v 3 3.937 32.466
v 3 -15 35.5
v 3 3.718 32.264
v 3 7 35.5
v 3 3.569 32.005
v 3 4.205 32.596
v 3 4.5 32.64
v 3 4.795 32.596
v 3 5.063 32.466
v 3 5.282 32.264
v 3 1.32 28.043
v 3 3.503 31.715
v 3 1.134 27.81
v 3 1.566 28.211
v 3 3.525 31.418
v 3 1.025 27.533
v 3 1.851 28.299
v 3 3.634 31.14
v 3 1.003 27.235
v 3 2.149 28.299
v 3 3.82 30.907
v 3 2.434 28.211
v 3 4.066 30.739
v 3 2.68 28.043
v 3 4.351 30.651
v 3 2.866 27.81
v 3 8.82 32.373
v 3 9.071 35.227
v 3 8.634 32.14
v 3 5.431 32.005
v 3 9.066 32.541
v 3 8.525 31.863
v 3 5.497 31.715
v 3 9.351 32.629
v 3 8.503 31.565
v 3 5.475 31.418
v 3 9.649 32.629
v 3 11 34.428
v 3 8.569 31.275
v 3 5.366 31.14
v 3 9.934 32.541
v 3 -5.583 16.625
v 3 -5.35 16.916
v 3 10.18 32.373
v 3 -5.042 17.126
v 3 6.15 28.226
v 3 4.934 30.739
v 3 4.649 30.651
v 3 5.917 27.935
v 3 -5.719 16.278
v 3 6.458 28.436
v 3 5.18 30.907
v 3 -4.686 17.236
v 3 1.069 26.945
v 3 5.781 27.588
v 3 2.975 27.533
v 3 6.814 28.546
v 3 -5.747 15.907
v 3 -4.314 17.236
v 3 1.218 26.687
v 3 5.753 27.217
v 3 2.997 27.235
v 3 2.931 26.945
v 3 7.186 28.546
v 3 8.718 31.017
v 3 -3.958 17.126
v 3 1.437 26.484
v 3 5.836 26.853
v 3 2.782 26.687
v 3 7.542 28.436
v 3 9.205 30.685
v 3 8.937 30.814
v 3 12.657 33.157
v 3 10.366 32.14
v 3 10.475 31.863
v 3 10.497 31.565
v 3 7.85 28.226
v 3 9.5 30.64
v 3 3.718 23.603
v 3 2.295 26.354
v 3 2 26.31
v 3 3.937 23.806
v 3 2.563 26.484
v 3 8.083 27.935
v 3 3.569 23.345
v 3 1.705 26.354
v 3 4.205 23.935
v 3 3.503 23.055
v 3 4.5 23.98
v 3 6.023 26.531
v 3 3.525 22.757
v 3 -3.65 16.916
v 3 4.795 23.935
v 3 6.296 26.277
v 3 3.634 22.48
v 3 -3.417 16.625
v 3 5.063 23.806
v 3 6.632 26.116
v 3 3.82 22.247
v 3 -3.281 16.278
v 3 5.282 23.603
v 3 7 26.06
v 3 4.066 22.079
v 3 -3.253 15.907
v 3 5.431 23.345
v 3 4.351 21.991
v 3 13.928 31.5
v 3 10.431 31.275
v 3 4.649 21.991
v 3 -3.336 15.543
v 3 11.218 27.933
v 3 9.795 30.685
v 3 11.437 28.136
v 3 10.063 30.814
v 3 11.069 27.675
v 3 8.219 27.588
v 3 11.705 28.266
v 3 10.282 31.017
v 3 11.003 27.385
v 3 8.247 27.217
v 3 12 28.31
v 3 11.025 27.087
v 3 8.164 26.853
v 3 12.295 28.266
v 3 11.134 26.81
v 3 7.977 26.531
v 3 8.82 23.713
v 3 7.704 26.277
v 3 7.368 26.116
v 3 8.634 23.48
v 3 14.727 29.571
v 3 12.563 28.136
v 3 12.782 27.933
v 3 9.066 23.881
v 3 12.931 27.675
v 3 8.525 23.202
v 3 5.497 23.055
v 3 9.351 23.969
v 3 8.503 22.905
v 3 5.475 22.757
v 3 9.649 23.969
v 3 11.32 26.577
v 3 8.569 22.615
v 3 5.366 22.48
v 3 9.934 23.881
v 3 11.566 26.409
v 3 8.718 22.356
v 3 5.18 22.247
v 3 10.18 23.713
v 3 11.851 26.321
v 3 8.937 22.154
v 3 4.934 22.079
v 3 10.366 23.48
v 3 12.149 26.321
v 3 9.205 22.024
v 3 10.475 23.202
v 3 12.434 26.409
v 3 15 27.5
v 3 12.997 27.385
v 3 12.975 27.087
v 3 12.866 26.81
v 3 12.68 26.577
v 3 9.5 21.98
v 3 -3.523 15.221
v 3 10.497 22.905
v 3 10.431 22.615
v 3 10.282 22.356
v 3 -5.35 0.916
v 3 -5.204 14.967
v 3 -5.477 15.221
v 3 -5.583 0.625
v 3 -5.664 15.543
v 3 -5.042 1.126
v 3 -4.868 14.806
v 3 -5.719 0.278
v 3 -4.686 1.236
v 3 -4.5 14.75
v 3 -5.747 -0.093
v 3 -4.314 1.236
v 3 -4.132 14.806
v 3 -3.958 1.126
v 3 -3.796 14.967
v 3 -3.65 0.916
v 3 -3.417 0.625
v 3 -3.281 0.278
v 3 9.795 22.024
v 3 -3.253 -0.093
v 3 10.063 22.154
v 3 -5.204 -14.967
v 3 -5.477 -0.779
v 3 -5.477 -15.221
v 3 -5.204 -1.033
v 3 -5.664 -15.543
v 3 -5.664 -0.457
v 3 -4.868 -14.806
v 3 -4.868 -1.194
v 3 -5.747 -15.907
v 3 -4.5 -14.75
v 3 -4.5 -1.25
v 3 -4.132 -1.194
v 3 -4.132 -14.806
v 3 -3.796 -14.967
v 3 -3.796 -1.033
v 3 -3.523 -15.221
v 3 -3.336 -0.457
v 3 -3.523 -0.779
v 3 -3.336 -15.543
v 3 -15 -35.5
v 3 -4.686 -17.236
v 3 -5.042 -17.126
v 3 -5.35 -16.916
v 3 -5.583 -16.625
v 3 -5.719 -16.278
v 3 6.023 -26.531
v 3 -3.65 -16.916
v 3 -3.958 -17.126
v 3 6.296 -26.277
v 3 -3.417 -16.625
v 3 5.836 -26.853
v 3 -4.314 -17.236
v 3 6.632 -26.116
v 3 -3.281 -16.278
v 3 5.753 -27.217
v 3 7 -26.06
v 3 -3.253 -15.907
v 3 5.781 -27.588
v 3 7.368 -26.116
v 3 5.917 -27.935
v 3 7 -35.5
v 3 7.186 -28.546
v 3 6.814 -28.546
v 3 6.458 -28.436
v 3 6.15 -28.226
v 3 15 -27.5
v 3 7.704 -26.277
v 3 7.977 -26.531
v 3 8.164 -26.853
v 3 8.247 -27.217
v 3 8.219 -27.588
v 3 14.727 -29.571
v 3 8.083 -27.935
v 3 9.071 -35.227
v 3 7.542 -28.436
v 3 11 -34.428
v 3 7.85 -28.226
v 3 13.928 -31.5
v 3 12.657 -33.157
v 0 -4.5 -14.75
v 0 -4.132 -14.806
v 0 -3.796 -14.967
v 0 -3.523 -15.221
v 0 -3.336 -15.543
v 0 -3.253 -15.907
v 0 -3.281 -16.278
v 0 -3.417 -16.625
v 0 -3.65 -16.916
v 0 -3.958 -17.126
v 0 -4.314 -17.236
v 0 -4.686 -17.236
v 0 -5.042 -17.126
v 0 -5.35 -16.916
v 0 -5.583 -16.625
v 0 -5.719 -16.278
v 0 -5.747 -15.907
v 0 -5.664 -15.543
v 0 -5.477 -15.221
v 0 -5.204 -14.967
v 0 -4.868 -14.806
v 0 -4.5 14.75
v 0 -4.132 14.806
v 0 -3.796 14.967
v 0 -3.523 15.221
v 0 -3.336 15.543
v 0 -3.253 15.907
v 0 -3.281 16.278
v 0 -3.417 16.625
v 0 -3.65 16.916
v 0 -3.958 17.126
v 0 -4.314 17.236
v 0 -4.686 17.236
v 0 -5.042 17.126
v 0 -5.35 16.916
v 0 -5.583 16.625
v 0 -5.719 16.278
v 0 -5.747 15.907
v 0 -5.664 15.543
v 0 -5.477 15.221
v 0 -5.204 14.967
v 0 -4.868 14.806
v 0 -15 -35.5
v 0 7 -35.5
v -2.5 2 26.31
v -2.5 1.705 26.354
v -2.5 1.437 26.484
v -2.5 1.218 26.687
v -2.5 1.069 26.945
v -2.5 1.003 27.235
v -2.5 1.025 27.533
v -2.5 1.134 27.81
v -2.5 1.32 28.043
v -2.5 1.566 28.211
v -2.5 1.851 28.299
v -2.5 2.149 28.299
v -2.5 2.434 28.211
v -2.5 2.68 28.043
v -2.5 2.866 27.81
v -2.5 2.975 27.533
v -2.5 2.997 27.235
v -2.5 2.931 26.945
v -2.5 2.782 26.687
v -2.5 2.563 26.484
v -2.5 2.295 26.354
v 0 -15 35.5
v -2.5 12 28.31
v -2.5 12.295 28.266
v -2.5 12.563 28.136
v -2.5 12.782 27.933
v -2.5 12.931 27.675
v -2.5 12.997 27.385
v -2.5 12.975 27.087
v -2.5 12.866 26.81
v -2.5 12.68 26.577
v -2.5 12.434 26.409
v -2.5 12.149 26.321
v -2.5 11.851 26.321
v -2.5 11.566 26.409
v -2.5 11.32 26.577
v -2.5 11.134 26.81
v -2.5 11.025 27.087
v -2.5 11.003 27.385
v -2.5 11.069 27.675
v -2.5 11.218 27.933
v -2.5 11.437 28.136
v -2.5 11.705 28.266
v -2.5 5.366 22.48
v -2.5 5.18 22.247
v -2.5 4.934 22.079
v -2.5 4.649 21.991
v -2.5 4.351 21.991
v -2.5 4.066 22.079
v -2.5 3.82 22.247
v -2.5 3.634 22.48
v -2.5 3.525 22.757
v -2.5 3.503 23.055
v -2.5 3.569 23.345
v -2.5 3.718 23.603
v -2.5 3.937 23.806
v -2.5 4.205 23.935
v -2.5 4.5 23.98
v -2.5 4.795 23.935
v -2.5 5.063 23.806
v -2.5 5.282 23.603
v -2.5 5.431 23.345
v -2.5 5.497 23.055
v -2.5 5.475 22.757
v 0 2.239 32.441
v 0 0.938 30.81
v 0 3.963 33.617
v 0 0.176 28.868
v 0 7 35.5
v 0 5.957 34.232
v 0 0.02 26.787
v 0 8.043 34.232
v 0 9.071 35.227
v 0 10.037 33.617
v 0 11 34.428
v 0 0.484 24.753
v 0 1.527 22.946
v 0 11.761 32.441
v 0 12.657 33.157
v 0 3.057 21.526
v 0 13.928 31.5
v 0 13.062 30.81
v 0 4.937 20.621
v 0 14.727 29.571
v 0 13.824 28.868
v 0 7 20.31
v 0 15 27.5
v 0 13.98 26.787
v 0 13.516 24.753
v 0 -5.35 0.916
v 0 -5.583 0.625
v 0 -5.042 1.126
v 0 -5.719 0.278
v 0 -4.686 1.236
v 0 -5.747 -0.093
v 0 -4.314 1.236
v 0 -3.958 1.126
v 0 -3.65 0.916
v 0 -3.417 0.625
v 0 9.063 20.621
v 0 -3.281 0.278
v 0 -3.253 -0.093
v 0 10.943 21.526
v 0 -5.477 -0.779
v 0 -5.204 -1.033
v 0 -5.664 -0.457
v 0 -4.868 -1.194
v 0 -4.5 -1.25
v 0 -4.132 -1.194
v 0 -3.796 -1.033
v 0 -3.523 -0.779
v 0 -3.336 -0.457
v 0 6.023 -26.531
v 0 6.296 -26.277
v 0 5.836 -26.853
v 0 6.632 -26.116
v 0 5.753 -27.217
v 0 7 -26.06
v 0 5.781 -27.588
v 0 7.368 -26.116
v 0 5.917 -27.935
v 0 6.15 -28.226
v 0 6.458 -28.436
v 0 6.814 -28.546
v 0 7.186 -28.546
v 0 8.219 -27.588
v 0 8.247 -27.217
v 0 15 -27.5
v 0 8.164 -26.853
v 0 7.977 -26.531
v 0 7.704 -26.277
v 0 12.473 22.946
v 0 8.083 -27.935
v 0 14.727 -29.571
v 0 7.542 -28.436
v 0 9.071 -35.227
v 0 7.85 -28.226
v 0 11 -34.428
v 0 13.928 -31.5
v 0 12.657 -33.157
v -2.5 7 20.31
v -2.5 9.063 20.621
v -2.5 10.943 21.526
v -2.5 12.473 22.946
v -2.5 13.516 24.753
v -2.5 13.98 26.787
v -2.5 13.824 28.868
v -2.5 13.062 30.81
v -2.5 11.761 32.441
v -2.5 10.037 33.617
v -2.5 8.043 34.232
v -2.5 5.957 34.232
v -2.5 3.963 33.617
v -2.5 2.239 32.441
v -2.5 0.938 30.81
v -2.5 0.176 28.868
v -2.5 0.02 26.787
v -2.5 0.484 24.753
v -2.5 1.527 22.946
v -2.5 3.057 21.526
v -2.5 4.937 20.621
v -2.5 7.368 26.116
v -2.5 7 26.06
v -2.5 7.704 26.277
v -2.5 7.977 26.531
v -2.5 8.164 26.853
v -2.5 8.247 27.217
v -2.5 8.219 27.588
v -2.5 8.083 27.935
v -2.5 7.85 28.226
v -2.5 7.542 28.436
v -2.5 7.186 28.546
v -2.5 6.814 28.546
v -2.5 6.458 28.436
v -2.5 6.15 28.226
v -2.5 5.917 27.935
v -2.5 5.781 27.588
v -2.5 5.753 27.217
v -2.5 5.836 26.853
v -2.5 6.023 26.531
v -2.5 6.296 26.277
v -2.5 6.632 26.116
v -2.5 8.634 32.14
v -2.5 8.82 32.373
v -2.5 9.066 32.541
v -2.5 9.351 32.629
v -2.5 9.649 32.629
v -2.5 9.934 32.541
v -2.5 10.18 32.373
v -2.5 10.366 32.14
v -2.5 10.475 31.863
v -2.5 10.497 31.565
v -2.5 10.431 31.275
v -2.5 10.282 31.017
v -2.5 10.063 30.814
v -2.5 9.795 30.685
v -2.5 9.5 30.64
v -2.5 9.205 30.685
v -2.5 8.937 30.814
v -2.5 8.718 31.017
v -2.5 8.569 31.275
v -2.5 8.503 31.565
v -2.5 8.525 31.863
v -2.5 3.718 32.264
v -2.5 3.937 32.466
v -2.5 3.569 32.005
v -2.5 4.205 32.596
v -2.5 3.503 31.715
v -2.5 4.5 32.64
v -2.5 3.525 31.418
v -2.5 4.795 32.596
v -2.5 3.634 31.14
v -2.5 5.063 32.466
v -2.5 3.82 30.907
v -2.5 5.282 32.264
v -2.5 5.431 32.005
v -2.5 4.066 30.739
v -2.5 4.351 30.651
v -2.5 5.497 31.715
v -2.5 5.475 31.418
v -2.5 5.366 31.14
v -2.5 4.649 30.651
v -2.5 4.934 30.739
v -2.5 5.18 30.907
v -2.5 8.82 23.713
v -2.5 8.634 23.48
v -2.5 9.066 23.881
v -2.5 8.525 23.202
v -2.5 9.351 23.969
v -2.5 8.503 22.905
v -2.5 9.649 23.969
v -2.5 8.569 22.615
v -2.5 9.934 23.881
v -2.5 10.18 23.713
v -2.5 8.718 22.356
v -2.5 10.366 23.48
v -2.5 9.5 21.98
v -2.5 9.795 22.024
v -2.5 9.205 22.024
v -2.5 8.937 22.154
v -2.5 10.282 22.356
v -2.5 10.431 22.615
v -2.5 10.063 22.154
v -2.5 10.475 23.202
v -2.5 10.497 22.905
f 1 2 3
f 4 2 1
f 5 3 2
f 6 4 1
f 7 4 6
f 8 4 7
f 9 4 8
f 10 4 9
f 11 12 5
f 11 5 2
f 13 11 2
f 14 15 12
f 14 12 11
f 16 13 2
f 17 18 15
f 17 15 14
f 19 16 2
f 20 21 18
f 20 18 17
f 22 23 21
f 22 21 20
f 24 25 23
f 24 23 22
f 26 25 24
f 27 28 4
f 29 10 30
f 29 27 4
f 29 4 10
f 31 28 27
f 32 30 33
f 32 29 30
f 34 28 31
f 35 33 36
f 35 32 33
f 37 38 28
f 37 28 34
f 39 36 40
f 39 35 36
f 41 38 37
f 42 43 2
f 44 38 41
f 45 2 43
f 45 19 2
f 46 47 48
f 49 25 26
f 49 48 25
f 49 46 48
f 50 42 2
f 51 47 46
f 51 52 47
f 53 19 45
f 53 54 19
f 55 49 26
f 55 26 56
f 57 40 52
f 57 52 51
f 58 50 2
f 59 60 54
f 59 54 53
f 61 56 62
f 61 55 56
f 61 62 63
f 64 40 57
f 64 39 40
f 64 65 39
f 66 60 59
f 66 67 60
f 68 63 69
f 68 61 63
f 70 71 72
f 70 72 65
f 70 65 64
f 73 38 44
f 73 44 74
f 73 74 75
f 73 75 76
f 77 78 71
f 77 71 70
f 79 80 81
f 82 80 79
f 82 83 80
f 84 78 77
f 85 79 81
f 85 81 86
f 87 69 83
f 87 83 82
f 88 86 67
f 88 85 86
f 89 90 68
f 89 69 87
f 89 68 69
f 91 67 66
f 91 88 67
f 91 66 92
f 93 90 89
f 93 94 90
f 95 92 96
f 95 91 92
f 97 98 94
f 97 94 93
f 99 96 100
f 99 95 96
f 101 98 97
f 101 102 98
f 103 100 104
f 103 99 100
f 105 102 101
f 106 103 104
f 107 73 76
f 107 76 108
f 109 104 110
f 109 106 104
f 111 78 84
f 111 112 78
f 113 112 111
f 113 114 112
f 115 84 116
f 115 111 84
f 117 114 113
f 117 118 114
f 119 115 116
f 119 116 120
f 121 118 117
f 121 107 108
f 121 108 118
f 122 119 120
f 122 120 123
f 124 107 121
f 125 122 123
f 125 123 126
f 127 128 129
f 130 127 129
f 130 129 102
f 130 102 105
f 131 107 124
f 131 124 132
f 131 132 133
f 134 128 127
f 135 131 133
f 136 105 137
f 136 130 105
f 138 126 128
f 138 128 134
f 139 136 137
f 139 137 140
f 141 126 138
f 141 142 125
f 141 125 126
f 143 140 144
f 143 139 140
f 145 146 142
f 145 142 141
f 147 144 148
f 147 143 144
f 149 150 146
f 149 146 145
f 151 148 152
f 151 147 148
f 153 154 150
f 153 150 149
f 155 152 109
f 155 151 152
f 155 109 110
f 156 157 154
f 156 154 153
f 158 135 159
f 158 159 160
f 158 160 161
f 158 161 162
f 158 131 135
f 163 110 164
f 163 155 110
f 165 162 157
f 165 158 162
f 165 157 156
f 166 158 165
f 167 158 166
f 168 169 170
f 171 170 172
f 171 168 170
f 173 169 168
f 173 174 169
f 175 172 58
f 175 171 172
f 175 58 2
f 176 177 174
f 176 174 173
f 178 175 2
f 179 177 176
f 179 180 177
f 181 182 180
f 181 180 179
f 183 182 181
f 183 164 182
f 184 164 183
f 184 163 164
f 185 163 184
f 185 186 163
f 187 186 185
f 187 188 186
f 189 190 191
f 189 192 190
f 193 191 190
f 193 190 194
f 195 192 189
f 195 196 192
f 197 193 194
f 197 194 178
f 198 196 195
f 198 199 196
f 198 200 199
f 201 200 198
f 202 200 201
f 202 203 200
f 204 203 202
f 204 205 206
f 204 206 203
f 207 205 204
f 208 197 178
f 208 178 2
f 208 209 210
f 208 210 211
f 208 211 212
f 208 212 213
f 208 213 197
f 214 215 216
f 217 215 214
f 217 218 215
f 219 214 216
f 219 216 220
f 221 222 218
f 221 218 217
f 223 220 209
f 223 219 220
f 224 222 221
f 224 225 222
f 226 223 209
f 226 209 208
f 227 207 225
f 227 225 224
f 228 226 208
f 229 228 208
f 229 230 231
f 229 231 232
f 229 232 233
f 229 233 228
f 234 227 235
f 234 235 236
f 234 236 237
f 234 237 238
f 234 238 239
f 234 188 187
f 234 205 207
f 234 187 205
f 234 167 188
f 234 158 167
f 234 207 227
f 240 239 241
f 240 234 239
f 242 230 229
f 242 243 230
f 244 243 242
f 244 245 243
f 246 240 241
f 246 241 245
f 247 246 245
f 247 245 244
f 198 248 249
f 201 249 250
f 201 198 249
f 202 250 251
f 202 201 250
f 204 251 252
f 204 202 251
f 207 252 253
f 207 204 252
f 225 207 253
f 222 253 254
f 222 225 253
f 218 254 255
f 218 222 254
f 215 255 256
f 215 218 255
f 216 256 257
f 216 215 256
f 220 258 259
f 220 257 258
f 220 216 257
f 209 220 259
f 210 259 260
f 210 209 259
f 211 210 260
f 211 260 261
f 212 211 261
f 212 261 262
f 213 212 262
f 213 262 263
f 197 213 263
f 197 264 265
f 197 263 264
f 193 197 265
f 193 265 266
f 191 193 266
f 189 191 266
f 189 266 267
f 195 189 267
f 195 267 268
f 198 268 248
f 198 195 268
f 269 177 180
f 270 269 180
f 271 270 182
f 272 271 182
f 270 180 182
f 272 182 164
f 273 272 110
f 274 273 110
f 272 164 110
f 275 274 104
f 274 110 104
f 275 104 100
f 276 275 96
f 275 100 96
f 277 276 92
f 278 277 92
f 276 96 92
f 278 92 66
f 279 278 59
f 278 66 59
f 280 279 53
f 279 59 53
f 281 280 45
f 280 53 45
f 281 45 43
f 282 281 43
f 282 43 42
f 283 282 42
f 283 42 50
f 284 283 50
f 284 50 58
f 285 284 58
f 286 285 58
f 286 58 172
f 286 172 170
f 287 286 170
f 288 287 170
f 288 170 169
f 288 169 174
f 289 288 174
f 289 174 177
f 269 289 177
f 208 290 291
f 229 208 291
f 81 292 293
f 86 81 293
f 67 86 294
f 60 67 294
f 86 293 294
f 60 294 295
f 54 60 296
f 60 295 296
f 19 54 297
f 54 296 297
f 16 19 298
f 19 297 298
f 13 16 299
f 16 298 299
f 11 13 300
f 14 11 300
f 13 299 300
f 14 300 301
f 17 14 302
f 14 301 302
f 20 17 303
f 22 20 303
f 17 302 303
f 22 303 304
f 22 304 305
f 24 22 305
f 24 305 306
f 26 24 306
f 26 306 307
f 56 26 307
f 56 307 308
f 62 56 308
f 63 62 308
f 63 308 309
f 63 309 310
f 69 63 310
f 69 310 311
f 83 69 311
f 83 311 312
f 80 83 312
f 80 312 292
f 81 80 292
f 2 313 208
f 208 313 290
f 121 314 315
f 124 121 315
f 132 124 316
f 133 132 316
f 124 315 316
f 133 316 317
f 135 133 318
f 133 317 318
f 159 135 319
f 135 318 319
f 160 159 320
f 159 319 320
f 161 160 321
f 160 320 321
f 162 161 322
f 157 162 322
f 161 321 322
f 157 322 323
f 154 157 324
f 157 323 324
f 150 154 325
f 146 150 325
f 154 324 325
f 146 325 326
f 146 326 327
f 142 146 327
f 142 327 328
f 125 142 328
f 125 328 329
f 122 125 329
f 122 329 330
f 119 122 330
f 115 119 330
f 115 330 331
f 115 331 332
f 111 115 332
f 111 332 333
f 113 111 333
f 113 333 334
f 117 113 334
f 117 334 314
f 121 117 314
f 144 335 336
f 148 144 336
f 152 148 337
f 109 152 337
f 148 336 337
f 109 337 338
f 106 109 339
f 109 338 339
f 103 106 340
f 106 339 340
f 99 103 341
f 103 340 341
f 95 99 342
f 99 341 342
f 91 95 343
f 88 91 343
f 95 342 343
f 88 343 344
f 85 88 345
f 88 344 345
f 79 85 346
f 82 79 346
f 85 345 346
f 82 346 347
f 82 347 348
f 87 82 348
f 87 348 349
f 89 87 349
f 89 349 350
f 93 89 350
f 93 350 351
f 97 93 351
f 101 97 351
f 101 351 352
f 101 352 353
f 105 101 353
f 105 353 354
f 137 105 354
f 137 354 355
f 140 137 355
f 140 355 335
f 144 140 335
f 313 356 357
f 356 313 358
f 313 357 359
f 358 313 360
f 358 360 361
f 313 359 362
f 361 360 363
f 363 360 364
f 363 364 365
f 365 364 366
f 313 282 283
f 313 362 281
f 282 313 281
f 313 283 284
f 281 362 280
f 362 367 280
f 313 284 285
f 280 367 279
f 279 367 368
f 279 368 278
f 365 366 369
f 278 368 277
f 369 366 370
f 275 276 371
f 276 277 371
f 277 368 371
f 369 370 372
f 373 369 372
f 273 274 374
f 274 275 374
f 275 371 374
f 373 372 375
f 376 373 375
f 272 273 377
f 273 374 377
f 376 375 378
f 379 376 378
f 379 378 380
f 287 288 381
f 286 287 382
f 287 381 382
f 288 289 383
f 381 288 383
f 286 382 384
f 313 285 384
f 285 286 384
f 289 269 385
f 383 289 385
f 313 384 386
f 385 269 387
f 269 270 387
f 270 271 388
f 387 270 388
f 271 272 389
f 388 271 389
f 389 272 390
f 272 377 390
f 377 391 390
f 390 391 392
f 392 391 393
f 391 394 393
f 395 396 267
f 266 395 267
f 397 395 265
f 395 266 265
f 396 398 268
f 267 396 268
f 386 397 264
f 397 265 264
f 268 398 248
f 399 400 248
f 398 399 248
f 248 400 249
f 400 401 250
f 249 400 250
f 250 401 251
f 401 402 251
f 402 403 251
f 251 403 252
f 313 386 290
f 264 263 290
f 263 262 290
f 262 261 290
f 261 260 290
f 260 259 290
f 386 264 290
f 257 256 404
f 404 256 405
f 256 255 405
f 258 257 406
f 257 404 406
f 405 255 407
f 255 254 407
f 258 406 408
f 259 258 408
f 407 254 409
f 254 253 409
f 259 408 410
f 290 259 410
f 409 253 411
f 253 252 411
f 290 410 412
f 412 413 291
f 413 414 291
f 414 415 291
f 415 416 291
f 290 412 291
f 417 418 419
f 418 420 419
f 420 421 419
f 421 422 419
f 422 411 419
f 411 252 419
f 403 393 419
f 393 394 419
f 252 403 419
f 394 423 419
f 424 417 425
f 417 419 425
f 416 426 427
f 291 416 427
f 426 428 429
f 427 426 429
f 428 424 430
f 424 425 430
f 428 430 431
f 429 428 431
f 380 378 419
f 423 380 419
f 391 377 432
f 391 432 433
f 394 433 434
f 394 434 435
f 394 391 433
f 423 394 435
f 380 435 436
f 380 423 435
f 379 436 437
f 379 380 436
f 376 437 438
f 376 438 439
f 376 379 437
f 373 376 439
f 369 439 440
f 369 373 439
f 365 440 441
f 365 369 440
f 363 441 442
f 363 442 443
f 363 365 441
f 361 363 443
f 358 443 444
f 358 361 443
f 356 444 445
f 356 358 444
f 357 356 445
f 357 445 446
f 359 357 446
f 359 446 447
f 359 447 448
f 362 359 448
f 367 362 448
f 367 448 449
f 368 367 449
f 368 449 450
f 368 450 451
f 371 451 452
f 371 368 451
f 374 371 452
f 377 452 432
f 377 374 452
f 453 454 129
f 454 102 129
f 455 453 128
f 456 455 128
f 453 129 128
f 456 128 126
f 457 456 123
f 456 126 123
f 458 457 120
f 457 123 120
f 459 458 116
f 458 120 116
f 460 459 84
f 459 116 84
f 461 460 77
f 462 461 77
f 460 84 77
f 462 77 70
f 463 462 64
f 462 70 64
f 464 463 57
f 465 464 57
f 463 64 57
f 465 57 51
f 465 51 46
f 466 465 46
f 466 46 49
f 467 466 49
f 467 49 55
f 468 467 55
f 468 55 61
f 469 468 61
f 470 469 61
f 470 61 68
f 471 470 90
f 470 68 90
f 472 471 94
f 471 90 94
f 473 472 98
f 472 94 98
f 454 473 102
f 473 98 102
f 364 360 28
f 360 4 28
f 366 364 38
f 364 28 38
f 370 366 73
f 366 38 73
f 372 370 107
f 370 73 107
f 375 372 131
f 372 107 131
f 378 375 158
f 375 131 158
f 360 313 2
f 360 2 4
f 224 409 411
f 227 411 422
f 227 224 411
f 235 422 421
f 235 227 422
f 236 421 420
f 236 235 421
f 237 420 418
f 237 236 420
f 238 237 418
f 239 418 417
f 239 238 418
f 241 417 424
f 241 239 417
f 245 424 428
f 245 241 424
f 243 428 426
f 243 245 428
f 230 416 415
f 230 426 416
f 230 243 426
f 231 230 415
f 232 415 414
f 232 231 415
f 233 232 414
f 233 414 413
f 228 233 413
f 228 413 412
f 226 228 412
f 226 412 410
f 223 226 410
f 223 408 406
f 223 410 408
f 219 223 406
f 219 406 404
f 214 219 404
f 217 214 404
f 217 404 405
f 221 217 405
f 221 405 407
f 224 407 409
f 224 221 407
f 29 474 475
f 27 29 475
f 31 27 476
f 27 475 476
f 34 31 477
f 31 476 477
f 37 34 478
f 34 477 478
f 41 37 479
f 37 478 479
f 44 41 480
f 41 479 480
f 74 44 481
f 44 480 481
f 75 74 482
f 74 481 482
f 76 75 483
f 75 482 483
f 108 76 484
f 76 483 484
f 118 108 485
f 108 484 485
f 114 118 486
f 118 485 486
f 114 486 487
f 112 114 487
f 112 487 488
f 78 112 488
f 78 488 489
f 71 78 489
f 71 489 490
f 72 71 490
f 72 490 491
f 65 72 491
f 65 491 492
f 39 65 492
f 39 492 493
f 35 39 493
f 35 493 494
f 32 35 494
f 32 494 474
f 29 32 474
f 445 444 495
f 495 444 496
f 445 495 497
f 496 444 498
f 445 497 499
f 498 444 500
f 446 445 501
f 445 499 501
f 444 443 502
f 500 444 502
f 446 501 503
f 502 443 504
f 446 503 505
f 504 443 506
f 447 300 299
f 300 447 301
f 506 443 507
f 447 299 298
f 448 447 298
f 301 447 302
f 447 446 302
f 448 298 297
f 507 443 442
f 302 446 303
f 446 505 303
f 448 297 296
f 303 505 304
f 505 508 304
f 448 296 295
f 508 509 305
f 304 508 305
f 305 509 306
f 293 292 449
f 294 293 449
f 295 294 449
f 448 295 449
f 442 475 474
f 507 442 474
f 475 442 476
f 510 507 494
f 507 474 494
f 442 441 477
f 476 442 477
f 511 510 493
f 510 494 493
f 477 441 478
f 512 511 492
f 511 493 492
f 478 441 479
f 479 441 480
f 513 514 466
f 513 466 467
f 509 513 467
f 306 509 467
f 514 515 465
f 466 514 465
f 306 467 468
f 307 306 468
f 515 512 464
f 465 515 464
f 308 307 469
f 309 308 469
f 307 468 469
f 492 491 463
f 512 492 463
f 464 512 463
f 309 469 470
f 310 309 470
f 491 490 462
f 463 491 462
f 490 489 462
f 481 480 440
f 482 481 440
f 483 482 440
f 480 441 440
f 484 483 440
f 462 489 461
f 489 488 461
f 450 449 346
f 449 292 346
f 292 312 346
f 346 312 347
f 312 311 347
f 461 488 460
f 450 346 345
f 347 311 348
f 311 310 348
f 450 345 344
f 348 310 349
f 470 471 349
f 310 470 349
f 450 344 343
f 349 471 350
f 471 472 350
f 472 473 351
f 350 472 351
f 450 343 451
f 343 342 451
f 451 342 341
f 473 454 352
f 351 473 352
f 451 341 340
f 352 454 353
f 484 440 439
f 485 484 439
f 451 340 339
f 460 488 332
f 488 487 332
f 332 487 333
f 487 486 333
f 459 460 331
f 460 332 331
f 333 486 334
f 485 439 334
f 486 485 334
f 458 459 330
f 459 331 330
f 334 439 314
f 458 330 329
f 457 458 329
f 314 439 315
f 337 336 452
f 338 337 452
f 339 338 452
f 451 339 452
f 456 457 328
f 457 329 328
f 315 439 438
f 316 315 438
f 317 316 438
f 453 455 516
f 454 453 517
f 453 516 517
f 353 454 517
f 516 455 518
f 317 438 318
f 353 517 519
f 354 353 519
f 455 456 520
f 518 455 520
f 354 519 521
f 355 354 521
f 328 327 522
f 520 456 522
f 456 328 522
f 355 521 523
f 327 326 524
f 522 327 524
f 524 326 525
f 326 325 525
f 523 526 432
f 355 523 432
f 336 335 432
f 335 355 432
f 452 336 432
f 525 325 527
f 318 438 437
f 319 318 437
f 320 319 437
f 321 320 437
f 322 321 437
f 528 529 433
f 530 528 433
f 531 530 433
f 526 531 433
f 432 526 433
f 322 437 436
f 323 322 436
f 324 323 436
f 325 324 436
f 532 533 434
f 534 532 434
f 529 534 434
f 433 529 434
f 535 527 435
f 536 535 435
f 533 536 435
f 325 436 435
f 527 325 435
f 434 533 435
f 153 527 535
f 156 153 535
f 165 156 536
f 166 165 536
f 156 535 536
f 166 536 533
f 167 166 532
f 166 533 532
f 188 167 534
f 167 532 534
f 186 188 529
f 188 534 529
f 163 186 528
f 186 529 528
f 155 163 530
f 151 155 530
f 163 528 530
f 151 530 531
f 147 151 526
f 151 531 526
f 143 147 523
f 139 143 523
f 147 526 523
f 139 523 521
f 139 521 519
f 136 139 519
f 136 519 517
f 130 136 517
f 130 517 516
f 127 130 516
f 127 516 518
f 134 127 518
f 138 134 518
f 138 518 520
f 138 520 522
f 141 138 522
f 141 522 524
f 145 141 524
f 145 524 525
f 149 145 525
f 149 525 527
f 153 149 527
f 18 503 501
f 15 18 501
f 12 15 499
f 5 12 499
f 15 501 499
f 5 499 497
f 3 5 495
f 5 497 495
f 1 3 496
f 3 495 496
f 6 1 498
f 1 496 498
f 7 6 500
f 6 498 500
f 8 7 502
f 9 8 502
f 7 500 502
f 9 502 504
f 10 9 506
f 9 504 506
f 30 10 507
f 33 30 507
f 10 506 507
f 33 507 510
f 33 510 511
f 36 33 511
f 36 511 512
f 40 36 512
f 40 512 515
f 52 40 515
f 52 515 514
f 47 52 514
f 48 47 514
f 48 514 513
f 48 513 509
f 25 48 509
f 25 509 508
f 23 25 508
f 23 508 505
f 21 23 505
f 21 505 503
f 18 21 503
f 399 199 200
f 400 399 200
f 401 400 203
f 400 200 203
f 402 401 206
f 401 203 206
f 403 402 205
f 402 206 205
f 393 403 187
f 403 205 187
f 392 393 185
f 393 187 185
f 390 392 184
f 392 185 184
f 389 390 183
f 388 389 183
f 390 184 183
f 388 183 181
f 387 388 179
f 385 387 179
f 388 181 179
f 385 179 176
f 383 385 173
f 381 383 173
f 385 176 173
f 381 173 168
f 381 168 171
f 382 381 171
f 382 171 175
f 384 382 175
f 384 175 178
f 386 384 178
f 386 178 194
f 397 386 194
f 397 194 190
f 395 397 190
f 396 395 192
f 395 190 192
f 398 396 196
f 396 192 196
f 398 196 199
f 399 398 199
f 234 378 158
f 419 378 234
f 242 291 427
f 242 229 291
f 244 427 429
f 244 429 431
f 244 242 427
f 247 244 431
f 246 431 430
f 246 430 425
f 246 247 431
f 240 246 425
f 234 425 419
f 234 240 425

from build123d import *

# Parameters (mm, degrees)
SKETCH1_W           = 71
SKETCH1_H           = 30
BOSS_EXTRUDE1_DEPTH = 3
SKETCH2_R           = 1.25
CUT_EXTRUDE1_DEPTH  = 5
FILLET1_R           = 8
SKETCH3_R           = 7
SKETCH3_R_2         = 1.25
BOSS_EXTRUDE2_DEPTH = 2.5
SKETCH4_R           = 1
CUT_EXTRUDE2_DEPTH  = 10
CIRPATTERN1_COUNT   = 6


with BuildPart() as part:
    # Sketch1 → Boss-Extrude1 (new body)
    with BuildSketch(Plane(origin=(0, 0, 0), x_dir=(0, 0, -1), z_dir=(1, 0, 0))):
        Rectangle(SKETCH1_W, SKETCH1_H)
    extrude(amount=BOSS_EXTRUDE1_DEPTH)

    # Sketch2 → Cut-Extrude1 (cut)
    with BuildSketch(Plane(origin=(3, 0, 0), x_dir=(0, 0, -1), z_dir=(1, 0, 0))):
        with Locations((-27.31, 7)):
            Circle(SKETCH2_R)
        with Locations((0, -4.5)):
            Circle(SKETCH2_R)
        with Locations((-16, -4.5)):
            Circle(SKETCH2_R)
    cut_extrude1 = extrude(amount=-CUT_EXTRUDE1_DEPTH, mode=Mode.SUBTRACT)

    # Mirror1: Cut-Extrude1 across plane
    add(cut_extrude1.mirror(Plane.XY), mode=Mode.SUBTRACT)

    # Fillet1
    fillet1_edges = [part.edges().sort_by_distance(p)[0] for p in [
        (1.5, 15, 35.5),
        (1.5, 15, -35.5),
    ]]
    fillet(fillet1_edges, radius=FILLET1_R)

    # Sketch3 → Boss-Extrude2 (add)
    with BuildSketch(Plane(origin=(0, 0, 0), x_dir=(0, 0, -1), z_dir=(1, 0, 0))):
        with Locations((-27.31, 7)):
            Circle(SKETCH3_R)
        with Locations((-27.31, 7)):
            Circle(SKETCH3_R_2, mode=Mode.SUBTRACT)
    extrude(amount=-BOSS_EXTRUDE2_DEPTH)

    # Sketch4 → Cut-Extrude2 (cut)
    with BuildSketch(Plane.ZY.offset(2.5)):
        with Locations((27.31, 12)):
            Circle(SKETCH4_R)
    cut_extrude2 = extrude(amount=-CUT_EXTRUDE2_DEPTH, mode=Mode.SUBTRACT)

    # CirPattern1: Cut-Extrude2 ×6 about axis
    cirpattern1_axis = Axis((0, 7, 27.31), (1, 0, 0))
    for i in range(1, CIRPATTERN1_COUNT):
        add(cut_extrude2.rotate(cirpattern1_axis, i * 360 / CIRPATTERN1_COUNT), mode=Mode.SUBTRACT)


solid = part.part
